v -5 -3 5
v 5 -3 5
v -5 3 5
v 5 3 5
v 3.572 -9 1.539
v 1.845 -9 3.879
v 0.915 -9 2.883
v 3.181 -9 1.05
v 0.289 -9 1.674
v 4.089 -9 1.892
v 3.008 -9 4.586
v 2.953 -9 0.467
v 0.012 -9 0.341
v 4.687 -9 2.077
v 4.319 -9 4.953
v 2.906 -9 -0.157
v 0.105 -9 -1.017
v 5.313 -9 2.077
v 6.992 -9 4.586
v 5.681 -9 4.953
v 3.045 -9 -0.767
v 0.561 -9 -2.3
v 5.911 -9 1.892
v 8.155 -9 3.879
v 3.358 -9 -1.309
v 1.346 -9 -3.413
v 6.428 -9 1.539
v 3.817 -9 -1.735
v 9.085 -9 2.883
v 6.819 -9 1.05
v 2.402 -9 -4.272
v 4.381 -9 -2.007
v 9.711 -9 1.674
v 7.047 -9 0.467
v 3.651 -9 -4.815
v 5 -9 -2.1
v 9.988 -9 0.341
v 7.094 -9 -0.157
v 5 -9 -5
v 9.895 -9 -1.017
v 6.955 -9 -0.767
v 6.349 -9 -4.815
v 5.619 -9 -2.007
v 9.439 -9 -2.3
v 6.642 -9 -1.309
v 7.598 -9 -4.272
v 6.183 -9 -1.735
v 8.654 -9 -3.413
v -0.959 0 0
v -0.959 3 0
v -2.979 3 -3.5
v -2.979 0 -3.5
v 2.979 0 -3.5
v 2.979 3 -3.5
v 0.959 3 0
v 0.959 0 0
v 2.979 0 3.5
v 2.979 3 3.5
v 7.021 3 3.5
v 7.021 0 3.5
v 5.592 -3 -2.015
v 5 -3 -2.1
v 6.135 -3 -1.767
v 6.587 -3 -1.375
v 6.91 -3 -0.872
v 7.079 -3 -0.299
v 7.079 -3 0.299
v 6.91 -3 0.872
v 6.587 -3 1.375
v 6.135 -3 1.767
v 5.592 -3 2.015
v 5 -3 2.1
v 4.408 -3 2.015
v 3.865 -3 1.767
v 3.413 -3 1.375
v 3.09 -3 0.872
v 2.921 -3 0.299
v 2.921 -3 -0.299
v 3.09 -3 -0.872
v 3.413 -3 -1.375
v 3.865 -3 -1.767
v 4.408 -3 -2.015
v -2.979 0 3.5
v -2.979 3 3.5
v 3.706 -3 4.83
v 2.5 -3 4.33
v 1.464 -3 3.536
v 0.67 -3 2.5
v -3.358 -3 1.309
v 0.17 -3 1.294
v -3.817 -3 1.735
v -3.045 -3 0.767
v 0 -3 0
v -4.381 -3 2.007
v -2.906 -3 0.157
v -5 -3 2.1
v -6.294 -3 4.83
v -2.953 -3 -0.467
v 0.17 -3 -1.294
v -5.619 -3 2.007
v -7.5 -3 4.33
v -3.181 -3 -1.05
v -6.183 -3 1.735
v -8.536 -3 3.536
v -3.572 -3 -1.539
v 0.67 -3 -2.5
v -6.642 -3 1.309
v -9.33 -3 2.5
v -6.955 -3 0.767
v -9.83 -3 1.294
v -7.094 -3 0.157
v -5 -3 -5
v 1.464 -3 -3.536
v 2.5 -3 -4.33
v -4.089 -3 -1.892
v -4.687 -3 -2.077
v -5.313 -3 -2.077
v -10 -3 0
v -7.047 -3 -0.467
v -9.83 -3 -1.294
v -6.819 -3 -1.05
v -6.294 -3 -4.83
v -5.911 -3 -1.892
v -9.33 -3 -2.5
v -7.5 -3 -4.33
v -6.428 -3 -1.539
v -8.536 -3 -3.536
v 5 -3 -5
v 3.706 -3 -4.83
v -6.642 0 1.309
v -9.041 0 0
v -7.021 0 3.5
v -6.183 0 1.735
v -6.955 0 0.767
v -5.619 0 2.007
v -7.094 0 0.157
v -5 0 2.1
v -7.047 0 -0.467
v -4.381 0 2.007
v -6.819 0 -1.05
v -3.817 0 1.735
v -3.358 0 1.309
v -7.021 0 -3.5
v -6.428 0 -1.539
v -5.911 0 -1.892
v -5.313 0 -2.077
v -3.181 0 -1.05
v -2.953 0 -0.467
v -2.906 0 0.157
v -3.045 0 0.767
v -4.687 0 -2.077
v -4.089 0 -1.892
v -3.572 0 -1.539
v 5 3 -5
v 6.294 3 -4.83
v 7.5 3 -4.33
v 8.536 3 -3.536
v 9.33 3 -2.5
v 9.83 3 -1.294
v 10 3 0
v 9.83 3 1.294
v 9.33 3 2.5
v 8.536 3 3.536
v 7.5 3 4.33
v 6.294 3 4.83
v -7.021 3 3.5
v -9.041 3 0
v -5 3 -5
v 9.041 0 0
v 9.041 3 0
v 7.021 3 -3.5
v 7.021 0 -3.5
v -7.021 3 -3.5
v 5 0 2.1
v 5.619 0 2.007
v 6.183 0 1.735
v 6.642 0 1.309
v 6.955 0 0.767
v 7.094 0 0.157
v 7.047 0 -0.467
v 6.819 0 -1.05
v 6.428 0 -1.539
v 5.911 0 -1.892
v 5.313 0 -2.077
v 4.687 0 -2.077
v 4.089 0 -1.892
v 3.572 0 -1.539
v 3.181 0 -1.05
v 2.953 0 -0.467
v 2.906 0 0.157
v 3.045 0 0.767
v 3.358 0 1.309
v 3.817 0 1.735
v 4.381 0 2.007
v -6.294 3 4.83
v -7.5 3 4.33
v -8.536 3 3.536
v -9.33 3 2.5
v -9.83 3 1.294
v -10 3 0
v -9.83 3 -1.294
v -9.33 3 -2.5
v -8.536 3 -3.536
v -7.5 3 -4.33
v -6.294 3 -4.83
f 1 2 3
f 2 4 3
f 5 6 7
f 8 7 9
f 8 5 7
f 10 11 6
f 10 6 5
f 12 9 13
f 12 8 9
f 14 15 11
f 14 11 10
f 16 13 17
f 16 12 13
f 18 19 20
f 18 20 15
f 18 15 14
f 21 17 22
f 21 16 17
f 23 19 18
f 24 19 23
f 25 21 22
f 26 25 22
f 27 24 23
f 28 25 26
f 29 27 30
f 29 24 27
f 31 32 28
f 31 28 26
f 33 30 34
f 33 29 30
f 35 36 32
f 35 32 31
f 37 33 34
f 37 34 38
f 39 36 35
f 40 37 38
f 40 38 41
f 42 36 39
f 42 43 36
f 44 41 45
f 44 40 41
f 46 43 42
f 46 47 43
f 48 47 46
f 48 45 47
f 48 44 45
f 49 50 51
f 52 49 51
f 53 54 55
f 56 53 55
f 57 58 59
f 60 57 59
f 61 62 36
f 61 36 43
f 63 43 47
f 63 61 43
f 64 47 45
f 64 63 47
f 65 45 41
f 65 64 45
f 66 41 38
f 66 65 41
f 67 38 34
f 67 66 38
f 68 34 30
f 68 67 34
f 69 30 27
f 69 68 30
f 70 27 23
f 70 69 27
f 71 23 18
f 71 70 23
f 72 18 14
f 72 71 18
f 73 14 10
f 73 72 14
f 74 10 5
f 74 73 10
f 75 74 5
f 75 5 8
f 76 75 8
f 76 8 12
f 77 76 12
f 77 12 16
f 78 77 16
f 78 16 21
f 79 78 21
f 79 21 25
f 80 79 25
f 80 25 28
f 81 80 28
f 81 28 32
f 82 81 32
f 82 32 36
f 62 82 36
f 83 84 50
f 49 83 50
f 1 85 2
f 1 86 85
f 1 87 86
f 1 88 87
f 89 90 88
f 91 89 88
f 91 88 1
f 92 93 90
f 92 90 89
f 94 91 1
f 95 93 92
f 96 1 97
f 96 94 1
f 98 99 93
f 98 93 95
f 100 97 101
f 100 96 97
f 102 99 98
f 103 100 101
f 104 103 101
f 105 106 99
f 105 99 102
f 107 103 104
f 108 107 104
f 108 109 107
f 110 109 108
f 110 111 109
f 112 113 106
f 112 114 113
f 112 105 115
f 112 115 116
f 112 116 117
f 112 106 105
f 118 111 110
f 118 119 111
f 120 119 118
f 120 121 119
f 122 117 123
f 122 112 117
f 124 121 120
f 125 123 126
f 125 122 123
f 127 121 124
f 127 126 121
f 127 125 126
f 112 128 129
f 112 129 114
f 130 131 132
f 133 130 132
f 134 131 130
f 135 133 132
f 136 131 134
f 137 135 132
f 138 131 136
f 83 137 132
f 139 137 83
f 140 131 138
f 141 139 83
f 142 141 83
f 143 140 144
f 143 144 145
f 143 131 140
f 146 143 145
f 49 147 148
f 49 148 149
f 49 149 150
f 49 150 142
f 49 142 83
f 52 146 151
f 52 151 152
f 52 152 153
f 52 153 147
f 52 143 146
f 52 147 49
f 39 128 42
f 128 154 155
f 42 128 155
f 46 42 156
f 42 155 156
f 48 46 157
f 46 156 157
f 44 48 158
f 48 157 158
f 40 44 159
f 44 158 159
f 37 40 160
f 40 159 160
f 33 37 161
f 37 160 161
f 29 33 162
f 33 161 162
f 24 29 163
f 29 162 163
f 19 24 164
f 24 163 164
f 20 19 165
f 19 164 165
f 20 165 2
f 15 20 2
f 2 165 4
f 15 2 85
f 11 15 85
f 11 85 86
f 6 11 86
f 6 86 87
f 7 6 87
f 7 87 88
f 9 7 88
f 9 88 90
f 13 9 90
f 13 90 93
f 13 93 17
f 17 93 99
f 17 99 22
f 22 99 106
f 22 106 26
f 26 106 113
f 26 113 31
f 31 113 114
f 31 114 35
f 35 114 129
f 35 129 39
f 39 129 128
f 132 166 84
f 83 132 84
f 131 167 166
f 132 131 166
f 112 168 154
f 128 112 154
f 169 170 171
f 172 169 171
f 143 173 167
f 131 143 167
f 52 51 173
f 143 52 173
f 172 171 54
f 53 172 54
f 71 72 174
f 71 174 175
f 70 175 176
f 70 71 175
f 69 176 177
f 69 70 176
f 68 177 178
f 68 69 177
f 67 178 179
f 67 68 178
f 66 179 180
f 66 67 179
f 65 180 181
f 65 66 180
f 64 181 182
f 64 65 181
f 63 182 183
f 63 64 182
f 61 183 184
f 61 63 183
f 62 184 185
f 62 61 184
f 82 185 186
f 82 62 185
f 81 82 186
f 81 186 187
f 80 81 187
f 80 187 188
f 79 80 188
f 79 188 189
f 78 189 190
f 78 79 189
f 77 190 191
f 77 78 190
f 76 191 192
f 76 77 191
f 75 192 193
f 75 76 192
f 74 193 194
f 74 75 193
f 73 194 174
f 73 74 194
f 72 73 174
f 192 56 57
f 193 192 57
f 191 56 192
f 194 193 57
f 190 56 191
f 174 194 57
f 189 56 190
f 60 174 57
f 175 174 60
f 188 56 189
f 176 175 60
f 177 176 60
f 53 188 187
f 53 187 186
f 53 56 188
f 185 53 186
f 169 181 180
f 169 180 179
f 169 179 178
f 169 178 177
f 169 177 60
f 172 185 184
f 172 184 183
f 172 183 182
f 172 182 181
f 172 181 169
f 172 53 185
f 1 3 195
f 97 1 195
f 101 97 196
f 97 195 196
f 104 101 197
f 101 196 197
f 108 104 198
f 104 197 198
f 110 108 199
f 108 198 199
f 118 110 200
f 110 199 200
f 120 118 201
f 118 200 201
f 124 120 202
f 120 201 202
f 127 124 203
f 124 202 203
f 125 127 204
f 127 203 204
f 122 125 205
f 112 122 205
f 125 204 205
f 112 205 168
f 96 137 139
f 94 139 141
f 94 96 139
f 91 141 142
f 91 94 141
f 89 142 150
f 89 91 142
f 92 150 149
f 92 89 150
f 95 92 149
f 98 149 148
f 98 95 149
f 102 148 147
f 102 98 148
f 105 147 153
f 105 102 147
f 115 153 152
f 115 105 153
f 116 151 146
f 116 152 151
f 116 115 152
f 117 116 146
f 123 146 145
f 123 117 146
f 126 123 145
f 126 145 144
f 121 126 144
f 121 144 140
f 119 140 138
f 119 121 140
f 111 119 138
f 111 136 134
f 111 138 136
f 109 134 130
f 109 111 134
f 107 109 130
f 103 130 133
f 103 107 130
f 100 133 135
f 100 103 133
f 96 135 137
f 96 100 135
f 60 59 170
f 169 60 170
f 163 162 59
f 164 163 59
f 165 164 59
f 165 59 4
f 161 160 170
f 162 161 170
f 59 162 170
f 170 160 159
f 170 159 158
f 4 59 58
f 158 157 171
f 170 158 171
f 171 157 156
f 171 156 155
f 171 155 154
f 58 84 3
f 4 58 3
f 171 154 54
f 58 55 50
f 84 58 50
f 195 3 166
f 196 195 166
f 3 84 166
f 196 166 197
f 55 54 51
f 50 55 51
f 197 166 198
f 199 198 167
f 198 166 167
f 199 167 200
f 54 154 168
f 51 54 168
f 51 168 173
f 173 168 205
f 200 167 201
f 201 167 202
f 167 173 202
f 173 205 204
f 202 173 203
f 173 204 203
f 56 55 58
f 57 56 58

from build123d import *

# Parameters (mm, degrees)
SKETCH1_R           = 2.1
BOSS_EXTRUDE1_DEPTH = 3
CUT_EXTRUDE1_DEPTH  = 3
SKETCH3_R           = 5
SKETCH3_R_2         = 2.1
BOSS_EXTRUDE2_DEPTH = 6


with BuildPart() as part:
    # Sketch1 → Boss-Extrude1 (new, symmetric)
    with BuildSketch(Plane(origin=(0, 0, 0), x_dir=(1, 0, 0), z_dir=(0, 1, 0))):
        with BuildLine():
            Line((-5, 5), (5, 5))
            ThreePointArc((5, 5), (10, 0), (5, -5))
            Line((5, -5), (-5, -5))
            ThreePointArc((-5, -5), (-10, 0), (-5, 5))
        make_face()
        with Locations(Location((5, 0, 0), (0, 0, 270))):
            Circle(SKETCH1_R, mode=Mode.SUBTRACT)
        with Locations(Location((-5, 0, 0), (0, 0, 270))):
            Circle(SKETCH1_R, mode=Mode.SUBTRACT)
    extrude(amount=BOSS_EXTRUDE1_DEPTH, both=True)

    # Sketch2 → Cut-Extrude1 (cut)
    with BuildSketch(Plane(origin=(0, 3, 0), x_dir=(1, 0, 0), z_dir=(0, 1, 0))):
        Polygon((-9.041451884, 0), (-7.020725942, -3.5), (-2.979274058, -3.5), (-0.958548116, 0), (-2.979274058, 3.5), (-7.020725942, 3.5), align=None)
        Polygon((9.041451884, 0), (7.020725942, 3.5), (2.979274058, 3.5), (0.958548116, 0), (2.979274058, -3.5), (7.020725942, -3.5), align=None)
    extrude(amount=-CUT_EXTRUDE1_DEPTH, mode=Mode.SUBTRACT)

    # Sketch3 → Boss-Extrude2 (add)
    with BuildSketch(Plane.XZ.offset(3)):
        with Locations(Location((5, 0, 0), (0, 0, 270))):
            Circle(SKETCH3_R)
        with Locations(Location((5, 0, 0), (0, 0, 270))):
            Circle(SKETCH3_R_2, mode=Mode.SUBTRACT)
    extrude(amount=BOSS_EXTRUDE2_DEPTH)


solid = part.part
